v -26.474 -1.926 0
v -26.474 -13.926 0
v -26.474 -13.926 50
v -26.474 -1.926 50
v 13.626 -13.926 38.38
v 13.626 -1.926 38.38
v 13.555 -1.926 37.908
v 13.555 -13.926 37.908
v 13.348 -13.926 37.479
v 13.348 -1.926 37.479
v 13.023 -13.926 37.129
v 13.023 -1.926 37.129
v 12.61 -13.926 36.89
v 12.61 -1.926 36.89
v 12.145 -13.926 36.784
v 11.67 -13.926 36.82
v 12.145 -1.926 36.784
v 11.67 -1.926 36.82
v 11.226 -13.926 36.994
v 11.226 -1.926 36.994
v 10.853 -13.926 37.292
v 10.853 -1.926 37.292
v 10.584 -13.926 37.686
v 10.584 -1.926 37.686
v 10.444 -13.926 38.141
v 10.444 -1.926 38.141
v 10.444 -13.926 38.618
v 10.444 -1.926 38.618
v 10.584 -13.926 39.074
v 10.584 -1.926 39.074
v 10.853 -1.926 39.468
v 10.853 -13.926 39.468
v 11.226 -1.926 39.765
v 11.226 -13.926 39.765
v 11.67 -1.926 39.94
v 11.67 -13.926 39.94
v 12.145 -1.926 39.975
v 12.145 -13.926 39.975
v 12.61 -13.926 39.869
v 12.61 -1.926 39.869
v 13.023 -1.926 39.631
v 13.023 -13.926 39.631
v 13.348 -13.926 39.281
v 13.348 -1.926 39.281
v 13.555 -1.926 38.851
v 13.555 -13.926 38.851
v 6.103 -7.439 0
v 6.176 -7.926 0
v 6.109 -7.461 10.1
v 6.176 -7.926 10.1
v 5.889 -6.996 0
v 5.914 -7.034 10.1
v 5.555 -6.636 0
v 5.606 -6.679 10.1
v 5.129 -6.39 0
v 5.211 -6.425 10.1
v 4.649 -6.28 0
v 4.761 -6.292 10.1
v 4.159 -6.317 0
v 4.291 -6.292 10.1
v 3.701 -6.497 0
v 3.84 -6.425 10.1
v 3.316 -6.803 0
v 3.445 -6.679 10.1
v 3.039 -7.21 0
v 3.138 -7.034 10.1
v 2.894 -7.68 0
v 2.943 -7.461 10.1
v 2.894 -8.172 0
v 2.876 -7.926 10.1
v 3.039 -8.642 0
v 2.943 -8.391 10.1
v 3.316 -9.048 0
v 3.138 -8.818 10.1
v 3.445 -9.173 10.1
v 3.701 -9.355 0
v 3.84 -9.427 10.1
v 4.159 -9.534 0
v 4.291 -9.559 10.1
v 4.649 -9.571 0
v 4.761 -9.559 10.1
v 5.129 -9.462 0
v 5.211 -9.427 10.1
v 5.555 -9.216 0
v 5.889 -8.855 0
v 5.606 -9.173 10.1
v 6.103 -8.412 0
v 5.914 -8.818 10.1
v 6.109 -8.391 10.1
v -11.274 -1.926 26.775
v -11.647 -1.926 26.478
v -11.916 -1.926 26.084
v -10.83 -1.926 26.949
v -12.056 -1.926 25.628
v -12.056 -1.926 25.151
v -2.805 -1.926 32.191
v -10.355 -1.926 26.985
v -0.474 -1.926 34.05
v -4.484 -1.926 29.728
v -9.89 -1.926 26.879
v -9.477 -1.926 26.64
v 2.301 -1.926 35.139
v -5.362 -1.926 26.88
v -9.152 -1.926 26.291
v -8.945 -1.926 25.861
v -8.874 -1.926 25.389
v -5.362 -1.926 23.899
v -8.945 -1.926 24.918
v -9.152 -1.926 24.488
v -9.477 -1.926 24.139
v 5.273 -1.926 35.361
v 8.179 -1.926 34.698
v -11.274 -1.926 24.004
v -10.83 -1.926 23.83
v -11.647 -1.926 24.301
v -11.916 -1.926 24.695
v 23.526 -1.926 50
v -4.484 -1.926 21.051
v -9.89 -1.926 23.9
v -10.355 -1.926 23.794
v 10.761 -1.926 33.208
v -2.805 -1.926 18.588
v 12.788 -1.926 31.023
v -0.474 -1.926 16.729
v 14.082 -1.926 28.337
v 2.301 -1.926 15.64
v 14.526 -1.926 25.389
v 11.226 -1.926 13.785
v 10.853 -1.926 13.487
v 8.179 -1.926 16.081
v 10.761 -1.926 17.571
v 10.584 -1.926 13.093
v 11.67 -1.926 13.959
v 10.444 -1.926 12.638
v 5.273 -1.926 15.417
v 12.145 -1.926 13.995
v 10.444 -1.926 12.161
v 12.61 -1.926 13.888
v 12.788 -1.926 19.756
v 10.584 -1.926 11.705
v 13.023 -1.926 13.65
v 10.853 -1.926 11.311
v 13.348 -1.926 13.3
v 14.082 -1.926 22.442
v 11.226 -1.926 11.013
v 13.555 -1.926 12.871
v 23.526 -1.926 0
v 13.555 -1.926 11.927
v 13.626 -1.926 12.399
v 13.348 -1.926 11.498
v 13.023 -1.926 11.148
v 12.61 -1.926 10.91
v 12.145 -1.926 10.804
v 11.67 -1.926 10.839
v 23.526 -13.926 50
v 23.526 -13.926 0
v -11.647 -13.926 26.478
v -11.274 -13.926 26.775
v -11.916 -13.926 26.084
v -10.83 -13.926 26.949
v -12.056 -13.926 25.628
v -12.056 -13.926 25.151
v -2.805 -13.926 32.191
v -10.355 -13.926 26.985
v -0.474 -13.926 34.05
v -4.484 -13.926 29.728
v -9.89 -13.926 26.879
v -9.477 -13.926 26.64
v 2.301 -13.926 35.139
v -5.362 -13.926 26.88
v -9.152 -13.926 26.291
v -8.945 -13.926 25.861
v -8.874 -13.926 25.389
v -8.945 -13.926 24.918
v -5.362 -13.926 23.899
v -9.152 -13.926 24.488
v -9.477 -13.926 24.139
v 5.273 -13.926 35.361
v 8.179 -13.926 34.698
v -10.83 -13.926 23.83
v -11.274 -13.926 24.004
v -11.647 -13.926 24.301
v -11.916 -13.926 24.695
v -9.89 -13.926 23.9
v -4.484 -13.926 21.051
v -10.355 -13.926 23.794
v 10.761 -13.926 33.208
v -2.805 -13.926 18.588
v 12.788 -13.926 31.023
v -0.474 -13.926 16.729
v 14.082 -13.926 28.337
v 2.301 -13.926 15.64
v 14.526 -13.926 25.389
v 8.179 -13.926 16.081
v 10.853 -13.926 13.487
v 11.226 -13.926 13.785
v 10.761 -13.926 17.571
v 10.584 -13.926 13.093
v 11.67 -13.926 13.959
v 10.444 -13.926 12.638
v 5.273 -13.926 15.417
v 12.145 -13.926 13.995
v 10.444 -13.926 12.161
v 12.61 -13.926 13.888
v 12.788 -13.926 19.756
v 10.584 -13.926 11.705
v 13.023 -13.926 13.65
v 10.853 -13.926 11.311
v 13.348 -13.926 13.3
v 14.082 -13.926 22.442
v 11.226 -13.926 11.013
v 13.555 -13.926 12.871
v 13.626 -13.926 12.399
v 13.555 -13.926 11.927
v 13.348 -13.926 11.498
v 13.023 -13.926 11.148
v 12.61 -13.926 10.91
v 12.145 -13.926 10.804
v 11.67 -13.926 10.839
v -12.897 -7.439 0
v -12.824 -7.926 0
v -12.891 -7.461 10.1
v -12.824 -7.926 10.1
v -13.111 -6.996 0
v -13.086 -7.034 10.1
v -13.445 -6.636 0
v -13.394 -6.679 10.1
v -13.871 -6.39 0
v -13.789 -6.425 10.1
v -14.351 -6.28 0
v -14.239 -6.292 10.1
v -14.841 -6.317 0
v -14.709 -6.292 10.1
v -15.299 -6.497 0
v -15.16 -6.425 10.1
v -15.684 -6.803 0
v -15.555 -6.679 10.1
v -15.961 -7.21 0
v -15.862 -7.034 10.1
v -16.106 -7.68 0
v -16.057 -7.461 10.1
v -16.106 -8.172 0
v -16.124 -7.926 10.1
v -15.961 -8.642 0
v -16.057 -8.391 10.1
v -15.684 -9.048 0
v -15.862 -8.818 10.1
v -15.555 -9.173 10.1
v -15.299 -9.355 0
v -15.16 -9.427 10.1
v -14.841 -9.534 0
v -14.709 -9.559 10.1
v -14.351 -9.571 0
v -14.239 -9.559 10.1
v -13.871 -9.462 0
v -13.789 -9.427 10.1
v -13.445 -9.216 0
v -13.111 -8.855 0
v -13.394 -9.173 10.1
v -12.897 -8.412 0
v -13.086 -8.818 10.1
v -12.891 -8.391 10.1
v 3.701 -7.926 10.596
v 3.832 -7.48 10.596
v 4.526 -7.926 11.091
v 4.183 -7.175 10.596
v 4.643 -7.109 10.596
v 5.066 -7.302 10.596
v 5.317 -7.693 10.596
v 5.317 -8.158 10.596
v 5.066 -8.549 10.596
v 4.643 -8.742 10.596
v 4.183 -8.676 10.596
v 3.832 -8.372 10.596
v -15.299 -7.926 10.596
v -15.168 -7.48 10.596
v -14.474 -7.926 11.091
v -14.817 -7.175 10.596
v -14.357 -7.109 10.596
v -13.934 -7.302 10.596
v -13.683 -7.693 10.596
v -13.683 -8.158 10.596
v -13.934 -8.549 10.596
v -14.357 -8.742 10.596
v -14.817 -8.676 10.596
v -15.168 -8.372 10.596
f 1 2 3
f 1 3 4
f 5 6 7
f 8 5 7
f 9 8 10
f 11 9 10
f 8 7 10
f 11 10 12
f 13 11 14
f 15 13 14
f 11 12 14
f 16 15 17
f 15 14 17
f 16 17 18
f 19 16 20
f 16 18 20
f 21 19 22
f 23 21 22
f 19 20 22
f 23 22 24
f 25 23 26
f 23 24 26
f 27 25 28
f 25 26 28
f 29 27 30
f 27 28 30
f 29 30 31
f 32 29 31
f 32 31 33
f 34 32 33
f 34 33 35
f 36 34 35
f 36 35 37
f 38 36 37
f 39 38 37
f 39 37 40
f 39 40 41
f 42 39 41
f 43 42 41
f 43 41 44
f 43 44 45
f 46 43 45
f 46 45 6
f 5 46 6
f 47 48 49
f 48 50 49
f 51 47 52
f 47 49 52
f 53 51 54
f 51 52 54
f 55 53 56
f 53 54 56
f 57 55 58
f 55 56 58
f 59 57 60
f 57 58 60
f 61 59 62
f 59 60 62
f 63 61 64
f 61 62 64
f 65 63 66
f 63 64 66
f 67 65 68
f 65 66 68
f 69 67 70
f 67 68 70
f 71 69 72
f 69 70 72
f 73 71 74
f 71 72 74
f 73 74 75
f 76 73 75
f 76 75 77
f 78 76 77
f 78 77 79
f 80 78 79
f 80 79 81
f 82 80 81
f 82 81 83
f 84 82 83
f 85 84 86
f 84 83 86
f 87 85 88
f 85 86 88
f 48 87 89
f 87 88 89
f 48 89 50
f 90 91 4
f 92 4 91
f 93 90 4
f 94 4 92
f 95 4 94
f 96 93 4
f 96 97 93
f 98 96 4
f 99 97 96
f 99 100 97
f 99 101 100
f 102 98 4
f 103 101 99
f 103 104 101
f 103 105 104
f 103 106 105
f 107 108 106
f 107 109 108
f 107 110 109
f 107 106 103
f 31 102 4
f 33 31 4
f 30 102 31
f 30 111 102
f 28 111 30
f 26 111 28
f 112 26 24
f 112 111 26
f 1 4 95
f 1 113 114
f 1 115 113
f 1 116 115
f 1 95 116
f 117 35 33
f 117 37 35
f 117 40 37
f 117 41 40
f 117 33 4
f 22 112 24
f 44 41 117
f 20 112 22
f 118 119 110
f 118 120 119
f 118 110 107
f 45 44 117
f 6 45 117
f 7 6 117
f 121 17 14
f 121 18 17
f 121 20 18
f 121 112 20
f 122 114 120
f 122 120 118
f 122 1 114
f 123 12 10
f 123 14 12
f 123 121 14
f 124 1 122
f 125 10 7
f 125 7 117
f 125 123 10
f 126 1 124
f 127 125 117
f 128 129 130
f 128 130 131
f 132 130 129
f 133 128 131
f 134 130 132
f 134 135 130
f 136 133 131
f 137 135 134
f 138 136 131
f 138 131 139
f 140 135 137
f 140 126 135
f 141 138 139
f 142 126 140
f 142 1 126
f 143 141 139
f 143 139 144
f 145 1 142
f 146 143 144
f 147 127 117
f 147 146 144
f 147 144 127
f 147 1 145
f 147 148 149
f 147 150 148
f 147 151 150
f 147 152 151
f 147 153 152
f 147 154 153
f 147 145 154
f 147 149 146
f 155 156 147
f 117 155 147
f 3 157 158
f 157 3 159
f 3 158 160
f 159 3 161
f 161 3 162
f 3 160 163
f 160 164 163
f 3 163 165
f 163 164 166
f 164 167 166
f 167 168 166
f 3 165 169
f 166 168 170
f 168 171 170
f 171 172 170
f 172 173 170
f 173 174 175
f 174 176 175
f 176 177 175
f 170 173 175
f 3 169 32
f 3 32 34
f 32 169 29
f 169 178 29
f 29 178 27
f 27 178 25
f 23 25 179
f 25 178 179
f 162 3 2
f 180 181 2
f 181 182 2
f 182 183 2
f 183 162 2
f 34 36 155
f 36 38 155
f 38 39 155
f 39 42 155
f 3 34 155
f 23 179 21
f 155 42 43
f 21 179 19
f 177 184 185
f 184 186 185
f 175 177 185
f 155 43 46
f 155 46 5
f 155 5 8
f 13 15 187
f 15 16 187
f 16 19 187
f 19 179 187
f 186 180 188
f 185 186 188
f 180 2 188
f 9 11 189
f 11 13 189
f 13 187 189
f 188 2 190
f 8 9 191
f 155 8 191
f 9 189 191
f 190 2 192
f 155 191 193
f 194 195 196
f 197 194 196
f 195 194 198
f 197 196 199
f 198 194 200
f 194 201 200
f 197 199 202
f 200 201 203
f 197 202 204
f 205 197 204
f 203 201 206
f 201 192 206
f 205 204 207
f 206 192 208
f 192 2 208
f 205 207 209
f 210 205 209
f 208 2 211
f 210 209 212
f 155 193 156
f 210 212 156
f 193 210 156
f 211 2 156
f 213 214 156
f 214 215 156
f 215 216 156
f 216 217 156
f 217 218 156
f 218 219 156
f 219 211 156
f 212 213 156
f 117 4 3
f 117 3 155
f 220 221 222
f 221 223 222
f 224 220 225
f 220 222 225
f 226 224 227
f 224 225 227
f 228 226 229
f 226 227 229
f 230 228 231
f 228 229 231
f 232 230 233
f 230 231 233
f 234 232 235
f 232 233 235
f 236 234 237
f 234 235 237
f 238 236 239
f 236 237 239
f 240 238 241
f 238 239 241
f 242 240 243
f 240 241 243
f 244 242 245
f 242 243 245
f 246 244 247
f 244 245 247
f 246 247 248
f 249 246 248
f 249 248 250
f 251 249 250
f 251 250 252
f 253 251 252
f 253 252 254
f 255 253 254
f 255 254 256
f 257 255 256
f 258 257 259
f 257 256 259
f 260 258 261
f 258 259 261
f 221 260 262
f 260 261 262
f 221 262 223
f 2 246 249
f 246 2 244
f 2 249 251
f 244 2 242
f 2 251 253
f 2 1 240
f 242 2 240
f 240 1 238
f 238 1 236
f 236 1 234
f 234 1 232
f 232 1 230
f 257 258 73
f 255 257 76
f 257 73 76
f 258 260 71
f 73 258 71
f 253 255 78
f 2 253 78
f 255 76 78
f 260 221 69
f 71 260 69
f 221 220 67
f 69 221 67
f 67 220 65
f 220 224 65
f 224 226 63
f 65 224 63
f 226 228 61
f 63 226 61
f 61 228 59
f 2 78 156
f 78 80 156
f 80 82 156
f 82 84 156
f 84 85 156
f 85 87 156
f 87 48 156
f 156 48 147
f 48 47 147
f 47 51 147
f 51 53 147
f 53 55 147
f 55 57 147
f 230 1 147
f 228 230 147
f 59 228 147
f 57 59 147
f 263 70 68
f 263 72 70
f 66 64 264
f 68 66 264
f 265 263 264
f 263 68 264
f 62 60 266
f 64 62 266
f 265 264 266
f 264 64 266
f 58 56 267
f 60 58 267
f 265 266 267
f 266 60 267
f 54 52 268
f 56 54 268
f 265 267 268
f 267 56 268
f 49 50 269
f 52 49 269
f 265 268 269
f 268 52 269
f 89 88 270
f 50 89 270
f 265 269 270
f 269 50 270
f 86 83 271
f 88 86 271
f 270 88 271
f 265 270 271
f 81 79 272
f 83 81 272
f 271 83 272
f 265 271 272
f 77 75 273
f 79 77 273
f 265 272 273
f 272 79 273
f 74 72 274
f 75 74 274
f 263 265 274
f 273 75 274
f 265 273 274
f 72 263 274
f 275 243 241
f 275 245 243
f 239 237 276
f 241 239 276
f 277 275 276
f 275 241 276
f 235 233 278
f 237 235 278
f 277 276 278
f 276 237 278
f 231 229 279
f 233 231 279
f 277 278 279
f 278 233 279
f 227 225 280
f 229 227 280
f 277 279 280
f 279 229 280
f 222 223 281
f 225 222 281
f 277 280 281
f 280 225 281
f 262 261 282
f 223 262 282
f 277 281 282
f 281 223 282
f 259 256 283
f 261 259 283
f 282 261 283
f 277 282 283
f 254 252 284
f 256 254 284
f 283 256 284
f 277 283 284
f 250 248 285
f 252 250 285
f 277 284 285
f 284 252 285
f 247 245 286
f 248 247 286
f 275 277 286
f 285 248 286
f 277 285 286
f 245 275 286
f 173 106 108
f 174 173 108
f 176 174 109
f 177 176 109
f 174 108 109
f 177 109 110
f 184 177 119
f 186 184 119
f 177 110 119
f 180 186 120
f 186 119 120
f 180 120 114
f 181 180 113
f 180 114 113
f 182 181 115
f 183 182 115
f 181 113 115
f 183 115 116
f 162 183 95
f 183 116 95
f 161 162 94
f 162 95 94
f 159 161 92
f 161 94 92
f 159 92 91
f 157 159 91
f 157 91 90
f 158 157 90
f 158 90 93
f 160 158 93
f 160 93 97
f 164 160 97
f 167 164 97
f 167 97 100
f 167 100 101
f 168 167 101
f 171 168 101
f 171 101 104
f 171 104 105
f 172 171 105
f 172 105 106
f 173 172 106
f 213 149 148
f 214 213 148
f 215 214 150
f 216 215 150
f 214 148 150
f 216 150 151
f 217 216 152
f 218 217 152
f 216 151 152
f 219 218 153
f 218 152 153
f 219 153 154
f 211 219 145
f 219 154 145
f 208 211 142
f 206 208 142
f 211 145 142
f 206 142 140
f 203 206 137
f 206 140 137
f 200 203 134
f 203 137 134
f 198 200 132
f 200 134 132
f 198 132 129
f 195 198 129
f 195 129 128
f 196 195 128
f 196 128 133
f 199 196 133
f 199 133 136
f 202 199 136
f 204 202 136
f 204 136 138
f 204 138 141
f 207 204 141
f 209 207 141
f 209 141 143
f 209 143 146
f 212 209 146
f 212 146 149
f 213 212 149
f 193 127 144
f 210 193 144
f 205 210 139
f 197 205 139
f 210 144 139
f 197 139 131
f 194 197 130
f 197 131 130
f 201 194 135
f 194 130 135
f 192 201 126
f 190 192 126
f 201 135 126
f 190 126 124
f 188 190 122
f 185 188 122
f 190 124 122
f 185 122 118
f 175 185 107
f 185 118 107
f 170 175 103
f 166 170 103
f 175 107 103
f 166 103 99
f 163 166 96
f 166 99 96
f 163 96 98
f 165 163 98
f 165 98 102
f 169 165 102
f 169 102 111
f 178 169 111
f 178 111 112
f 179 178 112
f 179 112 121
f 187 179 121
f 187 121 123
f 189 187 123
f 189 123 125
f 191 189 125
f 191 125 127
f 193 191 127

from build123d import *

# Parameters (mm, degrees)
SKETCH_1_W             = 50
SKETCH_1_H             = 12
EXTRUDE_1_DEPTH        = 50
HOLE_WIZARD_M4_1_D     = 3.3
HOLE_WIZARD_M4_1_DEPTH = 10.1
HOLE_WIZARD_M4_1_TIP   = 0.991420021
SKETCH_5_R             = 10
SKETCH_5_R_2           = 1.6
CUT_EXTRUDE_1_DEPTH    = 50


with BuildPart() as part:
    # 草图1 → 凸台-拉伸1 (new body)
    with BuildSketch(Plane.XY):
        with Locations((-1.474142426, -7.925704975)):
            Rectangle(SKETCH_1_W, SKETCH_1_H)
    extrude(amount=EXTRUDE_1_DEPTH)

    # M4 螺纹孔1
    with Locations(Plane(origin=(0, 0, 0), x_dir=(-1, 0, 0), z_dir=(0, 0, -1))):
        with Locations((-4.525857574, -7.925704975), (14.474142426, -7.925704975)):
            Hole(HOLE_WIZARD_M4_1_D / 2, depth=HOLE_WIZARD_M4_1_DEPTH)
            with Locations((0, 0, -(HOLE_WIZARD_M4_1_DEPTH + HOLE_WIZARD_M4_1_TIP / 2))):  # 118° drill point
                Cone(0, HOLE_WIZARD_M4_1_D / 2, HOLE_WIZARD_M4_1_TIP, mode=Mode.SUBTRACT)

    # 草图5 → 切除-拉伸1 (cut)
    with BuildSketch(Plane(origin=(0, -1.925704975, 0), x_dir=(1, 0, 0), z_dir=(0, 1, 0))):
        with Locations((4.525857574, -25.389445239)):
            Circle(SKETCH_5_R)
        with Locations((12.025857574, -12.399064182)):
            Circle(SKETCH_5_R_2)
        with Locations((12.025857574, -38.379826296)):
            Circle(SKETCH_5_R_2)
        with Locations((-10.474142426, -25.389445239)):
            Circle(SKETCH_5_R_2)
    extrude(amount=-CUT_EXTRUDE_1_DEPTH, mode=Mode.SUBTRACT)


solid = part.part
